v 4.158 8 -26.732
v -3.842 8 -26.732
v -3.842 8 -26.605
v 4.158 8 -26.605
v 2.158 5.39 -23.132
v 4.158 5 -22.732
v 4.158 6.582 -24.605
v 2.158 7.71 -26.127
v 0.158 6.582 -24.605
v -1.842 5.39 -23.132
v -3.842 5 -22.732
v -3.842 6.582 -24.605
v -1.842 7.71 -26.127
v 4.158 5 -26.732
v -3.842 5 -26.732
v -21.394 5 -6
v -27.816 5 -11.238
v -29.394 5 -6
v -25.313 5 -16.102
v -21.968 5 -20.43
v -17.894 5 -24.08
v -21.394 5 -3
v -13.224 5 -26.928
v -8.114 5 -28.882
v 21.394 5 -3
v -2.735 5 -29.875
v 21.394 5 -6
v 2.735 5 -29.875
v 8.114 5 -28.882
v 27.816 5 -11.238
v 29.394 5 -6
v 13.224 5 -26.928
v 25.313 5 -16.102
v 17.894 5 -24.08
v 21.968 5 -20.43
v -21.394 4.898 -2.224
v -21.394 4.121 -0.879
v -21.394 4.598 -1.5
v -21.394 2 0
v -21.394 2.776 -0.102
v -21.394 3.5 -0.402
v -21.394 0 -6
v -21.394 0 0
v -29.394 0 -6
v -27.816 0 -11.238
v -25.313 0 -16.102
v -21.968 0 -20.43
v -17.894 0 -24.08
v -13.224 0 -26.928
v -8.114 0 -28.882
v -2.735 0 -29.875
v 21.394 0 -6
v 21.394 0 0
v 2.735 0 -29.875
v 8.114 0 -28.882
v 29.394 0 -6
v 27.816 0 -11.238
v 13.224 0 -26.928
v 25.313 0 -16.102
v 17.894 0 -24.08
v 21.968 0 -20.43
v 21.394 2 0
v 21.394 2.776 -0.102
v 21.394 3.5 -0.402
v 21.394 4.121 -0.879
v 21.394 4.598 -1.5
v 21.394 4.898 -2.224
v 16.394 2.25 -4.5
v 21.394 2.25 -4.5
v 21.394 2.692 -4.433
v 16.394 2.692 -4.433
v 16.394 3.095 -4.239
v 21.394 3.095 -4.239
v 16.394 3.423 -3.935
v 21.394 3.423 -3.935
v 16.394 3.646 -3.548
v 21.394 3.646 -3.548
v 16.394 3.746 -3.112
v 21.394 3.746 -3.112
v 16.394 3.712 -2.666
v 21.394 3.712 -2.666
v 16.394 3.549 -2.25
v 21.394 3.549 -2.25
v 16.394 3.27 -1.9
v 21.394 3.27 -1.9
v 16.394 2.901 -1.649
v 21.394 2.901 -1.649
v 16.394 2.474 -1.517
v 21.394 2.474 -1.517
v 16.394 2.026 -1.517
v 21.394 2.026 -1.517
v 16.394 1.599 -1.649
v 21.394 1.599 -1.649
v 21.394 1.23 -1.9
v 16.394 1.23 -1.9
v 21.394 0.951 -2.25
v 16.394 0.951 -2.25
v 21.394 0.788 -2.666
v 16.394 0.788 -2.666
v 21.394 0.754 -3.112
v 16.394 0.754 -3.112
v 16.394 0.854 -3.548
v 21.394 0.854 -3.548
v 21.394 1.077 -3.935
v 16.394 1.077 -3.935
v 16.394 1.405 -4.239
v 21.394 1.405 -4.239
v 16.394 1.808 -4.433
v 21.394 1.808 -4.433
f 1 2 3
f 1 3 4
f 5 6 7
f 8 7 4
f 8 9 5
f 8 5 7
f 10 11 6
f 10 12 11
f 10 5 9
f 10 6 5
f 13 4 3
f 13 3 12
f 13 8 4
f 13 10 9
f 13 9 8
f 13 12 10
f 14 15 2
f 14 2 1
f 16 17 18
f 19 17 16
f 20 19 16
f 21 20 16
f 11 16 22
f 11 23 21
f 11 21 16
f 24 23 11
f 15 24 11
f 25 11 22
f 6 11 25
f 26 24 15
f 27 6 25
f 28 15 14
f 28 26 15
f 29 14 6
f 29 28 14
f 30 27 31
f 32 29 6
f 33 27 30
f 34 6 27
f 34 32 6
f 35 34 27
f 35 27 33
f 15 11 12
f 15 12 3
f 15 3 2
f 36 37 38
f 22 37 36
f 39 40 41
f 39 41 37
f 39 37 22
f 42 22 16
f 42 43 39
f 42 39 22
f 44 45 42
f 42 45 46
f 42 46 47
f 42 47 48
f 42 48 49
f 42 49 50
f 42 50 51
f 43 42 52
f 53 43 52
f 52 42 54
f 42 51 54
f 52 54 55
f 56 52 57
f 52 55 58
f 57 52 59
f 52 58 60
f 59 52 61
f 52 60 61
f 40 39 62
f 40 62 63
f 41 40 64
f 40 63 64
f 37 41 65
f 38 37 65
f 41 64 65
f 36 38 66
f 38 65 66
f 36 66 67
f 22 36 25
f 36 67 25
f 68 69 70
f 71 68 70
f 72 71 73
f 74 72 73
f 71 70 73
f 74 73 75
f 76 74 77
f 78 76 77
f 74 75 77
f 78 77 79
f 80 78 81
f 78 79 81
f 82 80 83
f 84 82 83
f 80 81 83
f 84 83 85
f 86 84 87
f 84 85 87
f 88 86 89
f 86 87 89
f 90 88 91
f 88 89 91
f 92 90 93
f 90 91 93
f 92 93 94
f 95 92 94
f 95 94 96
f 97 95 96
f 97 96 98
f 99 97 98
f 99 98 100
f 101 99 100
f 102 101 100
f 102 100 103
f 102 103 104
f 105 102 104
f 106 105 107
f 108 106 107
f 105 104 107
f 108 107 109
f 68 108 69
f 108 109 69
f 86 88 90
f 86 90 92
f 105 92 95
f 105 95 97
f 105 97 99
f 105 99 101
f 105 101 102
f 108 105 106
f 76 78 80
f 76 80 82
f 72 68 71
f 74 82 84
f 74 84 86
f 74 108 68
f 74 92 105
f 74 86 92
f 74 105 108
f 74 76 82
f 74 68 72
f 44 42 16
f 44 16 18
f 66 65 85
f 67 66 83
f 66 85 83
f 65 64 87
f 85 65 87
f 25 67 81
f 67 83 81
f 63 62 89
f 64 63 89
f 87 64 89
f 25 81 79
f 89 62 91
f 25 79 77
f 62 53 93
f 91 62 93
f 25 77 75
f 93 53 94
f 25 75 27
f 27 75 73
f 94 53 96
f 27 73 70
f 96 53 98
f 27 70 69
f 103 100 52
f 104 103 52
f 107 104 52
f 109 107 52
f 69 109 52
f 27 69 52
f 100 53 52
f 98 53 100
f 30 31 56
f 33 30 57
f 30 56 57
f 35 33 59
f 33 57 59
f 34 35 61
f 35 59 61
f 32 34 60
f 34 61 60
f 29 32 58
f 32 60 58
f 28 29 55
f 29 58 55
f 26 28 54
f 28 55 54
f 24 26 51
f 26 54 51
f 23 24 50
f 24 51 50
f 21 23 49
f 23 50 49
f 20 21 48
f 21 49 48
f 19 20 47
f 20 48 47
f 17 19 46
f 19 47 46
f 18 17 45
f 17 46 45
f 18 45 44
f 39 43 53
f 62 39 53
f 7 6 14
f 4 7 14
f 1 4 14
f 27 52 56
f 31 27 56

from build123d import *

# Parameters (mm, degrees)
BOSS_EXTRUDE1_DEPTH = 5
SKETCH3_W           = 8
SKETCH3_H           = 4
BOSS_EXTRUDE2_DEPTH = 3
FILLET1_START       = -3.841593316
FILLET1_DEPTH       = 8
CUT_EXTRUDE1_START  = -10
CUT_EXTRUDE1_DEPTH  = 10
FILLET2_R           = 3
SKETCH6_R           = 1.5
CUT_EXTRUDE2_DEPTH  = 5


with BuildPart() as part:
    # Sketch1 → Boss-Extrude1 (new body)
    with BuildSketch(Plane(origin=(0, 0, 0), x_dir=(1, 0, 0), z_dir=(0, 1, 0))):
        with BuildLine():
            Line((-30, 0), (30, 0))
            ThreePointArc((30, 0), (0, 30), (-30, 0))
        make_face()
    extrude(amount=BOSS_EXTRUDE1_DEPTH)

    # Sketch3 → Boss-Extrude2 (add)
    with BuildSketch(Plane(origin=(0, 5, 0), x_dir=(1, 0, 0), z_dir=(0, 1, 0))):
        with Locations((0.158406684, 24.731666579)):
            Rectangle(SKETCH3_W, SKETCH3_H)
    extrude(amount=BOSS_EXTRUDE2_DEPTH)

    # Fillet1: read off the stored shape, not the designer's step
    # Fillet1 outline → Fillet1 (cut)
    with BuildSketch(Plane.YZ.offset(FILLET1_START)):
        with BuildLine():
            Line((8, -22.731666579), (5, -22.731666579))
            add(Edge.make_bspline(
                [(5, -22.731666579), (8, -23.506263249), (8, -26.604649926)],
                knots=[0, 0, 0, 1, 1, 1], degree=2, weights=[1, 0.057495957, 1]))
            Line((8, -26.604649926), (8, -22.731666579))
        make_face()
    extrude(amount=FILLET1_DEPTH, mode=Mode.SUBTRACT)

    # Sketch5 → Cut-Extrude1 (cut)
    with BuildSketch(Plane(origin=(0, 5, 0), x_dir=(1, 0, 0), z_dir=(0, 1, 0)).offset(CUT_EXTRUDE1_START)):
        with BuildLine():
            Line((-21.393876913, 0), (-21.393876913, 6))
            Line((-21.393876913, 6), (-29.393876913, 6))
            ThreePointArc((-29.393876913, 6), (-29.84808459, 3.01526886), (-30, 0))
            Line((-30, 0), (-21.393876913, 0))
        make_face()
        with BuildLine():
            Line((21.393876913, 6), (29.393876913, 6))
            ThreePointArc((29.393876913, 6), (29.84808459, 3.01526886), (30, 0))
            Line((30, 0), (21.393876913, 0))
            Line((21.393876913, 0), (21.393876913, 6))
        make_face()
    extrude(amount=CUT_EXTRUDE1_DEPTH, mode=Mode.SUBTRACT)

    # Fillet2
    fillet2_edges = [part.edges().sort_by_distance(p)[0] for p in [
        (0, 5, 0),
    ]]
    fillet(fillet2_edges, radius=FILLET2_R)

    # Sketch6 → Cut-Extrude2 (cut)
    with BuildSketch(Plane(origin=(21.393876913, 0, 0), x_dir=(0, 0, -1), z_dir=(1, 0, 0))):
        with Locations((3, 2.25)):
            Circle(SKETCH6_R)
    extrude(amount=-CUT_EXTRUDE2_DEPTH, mode=Mode.SUBTRACT)


solid = part.part
